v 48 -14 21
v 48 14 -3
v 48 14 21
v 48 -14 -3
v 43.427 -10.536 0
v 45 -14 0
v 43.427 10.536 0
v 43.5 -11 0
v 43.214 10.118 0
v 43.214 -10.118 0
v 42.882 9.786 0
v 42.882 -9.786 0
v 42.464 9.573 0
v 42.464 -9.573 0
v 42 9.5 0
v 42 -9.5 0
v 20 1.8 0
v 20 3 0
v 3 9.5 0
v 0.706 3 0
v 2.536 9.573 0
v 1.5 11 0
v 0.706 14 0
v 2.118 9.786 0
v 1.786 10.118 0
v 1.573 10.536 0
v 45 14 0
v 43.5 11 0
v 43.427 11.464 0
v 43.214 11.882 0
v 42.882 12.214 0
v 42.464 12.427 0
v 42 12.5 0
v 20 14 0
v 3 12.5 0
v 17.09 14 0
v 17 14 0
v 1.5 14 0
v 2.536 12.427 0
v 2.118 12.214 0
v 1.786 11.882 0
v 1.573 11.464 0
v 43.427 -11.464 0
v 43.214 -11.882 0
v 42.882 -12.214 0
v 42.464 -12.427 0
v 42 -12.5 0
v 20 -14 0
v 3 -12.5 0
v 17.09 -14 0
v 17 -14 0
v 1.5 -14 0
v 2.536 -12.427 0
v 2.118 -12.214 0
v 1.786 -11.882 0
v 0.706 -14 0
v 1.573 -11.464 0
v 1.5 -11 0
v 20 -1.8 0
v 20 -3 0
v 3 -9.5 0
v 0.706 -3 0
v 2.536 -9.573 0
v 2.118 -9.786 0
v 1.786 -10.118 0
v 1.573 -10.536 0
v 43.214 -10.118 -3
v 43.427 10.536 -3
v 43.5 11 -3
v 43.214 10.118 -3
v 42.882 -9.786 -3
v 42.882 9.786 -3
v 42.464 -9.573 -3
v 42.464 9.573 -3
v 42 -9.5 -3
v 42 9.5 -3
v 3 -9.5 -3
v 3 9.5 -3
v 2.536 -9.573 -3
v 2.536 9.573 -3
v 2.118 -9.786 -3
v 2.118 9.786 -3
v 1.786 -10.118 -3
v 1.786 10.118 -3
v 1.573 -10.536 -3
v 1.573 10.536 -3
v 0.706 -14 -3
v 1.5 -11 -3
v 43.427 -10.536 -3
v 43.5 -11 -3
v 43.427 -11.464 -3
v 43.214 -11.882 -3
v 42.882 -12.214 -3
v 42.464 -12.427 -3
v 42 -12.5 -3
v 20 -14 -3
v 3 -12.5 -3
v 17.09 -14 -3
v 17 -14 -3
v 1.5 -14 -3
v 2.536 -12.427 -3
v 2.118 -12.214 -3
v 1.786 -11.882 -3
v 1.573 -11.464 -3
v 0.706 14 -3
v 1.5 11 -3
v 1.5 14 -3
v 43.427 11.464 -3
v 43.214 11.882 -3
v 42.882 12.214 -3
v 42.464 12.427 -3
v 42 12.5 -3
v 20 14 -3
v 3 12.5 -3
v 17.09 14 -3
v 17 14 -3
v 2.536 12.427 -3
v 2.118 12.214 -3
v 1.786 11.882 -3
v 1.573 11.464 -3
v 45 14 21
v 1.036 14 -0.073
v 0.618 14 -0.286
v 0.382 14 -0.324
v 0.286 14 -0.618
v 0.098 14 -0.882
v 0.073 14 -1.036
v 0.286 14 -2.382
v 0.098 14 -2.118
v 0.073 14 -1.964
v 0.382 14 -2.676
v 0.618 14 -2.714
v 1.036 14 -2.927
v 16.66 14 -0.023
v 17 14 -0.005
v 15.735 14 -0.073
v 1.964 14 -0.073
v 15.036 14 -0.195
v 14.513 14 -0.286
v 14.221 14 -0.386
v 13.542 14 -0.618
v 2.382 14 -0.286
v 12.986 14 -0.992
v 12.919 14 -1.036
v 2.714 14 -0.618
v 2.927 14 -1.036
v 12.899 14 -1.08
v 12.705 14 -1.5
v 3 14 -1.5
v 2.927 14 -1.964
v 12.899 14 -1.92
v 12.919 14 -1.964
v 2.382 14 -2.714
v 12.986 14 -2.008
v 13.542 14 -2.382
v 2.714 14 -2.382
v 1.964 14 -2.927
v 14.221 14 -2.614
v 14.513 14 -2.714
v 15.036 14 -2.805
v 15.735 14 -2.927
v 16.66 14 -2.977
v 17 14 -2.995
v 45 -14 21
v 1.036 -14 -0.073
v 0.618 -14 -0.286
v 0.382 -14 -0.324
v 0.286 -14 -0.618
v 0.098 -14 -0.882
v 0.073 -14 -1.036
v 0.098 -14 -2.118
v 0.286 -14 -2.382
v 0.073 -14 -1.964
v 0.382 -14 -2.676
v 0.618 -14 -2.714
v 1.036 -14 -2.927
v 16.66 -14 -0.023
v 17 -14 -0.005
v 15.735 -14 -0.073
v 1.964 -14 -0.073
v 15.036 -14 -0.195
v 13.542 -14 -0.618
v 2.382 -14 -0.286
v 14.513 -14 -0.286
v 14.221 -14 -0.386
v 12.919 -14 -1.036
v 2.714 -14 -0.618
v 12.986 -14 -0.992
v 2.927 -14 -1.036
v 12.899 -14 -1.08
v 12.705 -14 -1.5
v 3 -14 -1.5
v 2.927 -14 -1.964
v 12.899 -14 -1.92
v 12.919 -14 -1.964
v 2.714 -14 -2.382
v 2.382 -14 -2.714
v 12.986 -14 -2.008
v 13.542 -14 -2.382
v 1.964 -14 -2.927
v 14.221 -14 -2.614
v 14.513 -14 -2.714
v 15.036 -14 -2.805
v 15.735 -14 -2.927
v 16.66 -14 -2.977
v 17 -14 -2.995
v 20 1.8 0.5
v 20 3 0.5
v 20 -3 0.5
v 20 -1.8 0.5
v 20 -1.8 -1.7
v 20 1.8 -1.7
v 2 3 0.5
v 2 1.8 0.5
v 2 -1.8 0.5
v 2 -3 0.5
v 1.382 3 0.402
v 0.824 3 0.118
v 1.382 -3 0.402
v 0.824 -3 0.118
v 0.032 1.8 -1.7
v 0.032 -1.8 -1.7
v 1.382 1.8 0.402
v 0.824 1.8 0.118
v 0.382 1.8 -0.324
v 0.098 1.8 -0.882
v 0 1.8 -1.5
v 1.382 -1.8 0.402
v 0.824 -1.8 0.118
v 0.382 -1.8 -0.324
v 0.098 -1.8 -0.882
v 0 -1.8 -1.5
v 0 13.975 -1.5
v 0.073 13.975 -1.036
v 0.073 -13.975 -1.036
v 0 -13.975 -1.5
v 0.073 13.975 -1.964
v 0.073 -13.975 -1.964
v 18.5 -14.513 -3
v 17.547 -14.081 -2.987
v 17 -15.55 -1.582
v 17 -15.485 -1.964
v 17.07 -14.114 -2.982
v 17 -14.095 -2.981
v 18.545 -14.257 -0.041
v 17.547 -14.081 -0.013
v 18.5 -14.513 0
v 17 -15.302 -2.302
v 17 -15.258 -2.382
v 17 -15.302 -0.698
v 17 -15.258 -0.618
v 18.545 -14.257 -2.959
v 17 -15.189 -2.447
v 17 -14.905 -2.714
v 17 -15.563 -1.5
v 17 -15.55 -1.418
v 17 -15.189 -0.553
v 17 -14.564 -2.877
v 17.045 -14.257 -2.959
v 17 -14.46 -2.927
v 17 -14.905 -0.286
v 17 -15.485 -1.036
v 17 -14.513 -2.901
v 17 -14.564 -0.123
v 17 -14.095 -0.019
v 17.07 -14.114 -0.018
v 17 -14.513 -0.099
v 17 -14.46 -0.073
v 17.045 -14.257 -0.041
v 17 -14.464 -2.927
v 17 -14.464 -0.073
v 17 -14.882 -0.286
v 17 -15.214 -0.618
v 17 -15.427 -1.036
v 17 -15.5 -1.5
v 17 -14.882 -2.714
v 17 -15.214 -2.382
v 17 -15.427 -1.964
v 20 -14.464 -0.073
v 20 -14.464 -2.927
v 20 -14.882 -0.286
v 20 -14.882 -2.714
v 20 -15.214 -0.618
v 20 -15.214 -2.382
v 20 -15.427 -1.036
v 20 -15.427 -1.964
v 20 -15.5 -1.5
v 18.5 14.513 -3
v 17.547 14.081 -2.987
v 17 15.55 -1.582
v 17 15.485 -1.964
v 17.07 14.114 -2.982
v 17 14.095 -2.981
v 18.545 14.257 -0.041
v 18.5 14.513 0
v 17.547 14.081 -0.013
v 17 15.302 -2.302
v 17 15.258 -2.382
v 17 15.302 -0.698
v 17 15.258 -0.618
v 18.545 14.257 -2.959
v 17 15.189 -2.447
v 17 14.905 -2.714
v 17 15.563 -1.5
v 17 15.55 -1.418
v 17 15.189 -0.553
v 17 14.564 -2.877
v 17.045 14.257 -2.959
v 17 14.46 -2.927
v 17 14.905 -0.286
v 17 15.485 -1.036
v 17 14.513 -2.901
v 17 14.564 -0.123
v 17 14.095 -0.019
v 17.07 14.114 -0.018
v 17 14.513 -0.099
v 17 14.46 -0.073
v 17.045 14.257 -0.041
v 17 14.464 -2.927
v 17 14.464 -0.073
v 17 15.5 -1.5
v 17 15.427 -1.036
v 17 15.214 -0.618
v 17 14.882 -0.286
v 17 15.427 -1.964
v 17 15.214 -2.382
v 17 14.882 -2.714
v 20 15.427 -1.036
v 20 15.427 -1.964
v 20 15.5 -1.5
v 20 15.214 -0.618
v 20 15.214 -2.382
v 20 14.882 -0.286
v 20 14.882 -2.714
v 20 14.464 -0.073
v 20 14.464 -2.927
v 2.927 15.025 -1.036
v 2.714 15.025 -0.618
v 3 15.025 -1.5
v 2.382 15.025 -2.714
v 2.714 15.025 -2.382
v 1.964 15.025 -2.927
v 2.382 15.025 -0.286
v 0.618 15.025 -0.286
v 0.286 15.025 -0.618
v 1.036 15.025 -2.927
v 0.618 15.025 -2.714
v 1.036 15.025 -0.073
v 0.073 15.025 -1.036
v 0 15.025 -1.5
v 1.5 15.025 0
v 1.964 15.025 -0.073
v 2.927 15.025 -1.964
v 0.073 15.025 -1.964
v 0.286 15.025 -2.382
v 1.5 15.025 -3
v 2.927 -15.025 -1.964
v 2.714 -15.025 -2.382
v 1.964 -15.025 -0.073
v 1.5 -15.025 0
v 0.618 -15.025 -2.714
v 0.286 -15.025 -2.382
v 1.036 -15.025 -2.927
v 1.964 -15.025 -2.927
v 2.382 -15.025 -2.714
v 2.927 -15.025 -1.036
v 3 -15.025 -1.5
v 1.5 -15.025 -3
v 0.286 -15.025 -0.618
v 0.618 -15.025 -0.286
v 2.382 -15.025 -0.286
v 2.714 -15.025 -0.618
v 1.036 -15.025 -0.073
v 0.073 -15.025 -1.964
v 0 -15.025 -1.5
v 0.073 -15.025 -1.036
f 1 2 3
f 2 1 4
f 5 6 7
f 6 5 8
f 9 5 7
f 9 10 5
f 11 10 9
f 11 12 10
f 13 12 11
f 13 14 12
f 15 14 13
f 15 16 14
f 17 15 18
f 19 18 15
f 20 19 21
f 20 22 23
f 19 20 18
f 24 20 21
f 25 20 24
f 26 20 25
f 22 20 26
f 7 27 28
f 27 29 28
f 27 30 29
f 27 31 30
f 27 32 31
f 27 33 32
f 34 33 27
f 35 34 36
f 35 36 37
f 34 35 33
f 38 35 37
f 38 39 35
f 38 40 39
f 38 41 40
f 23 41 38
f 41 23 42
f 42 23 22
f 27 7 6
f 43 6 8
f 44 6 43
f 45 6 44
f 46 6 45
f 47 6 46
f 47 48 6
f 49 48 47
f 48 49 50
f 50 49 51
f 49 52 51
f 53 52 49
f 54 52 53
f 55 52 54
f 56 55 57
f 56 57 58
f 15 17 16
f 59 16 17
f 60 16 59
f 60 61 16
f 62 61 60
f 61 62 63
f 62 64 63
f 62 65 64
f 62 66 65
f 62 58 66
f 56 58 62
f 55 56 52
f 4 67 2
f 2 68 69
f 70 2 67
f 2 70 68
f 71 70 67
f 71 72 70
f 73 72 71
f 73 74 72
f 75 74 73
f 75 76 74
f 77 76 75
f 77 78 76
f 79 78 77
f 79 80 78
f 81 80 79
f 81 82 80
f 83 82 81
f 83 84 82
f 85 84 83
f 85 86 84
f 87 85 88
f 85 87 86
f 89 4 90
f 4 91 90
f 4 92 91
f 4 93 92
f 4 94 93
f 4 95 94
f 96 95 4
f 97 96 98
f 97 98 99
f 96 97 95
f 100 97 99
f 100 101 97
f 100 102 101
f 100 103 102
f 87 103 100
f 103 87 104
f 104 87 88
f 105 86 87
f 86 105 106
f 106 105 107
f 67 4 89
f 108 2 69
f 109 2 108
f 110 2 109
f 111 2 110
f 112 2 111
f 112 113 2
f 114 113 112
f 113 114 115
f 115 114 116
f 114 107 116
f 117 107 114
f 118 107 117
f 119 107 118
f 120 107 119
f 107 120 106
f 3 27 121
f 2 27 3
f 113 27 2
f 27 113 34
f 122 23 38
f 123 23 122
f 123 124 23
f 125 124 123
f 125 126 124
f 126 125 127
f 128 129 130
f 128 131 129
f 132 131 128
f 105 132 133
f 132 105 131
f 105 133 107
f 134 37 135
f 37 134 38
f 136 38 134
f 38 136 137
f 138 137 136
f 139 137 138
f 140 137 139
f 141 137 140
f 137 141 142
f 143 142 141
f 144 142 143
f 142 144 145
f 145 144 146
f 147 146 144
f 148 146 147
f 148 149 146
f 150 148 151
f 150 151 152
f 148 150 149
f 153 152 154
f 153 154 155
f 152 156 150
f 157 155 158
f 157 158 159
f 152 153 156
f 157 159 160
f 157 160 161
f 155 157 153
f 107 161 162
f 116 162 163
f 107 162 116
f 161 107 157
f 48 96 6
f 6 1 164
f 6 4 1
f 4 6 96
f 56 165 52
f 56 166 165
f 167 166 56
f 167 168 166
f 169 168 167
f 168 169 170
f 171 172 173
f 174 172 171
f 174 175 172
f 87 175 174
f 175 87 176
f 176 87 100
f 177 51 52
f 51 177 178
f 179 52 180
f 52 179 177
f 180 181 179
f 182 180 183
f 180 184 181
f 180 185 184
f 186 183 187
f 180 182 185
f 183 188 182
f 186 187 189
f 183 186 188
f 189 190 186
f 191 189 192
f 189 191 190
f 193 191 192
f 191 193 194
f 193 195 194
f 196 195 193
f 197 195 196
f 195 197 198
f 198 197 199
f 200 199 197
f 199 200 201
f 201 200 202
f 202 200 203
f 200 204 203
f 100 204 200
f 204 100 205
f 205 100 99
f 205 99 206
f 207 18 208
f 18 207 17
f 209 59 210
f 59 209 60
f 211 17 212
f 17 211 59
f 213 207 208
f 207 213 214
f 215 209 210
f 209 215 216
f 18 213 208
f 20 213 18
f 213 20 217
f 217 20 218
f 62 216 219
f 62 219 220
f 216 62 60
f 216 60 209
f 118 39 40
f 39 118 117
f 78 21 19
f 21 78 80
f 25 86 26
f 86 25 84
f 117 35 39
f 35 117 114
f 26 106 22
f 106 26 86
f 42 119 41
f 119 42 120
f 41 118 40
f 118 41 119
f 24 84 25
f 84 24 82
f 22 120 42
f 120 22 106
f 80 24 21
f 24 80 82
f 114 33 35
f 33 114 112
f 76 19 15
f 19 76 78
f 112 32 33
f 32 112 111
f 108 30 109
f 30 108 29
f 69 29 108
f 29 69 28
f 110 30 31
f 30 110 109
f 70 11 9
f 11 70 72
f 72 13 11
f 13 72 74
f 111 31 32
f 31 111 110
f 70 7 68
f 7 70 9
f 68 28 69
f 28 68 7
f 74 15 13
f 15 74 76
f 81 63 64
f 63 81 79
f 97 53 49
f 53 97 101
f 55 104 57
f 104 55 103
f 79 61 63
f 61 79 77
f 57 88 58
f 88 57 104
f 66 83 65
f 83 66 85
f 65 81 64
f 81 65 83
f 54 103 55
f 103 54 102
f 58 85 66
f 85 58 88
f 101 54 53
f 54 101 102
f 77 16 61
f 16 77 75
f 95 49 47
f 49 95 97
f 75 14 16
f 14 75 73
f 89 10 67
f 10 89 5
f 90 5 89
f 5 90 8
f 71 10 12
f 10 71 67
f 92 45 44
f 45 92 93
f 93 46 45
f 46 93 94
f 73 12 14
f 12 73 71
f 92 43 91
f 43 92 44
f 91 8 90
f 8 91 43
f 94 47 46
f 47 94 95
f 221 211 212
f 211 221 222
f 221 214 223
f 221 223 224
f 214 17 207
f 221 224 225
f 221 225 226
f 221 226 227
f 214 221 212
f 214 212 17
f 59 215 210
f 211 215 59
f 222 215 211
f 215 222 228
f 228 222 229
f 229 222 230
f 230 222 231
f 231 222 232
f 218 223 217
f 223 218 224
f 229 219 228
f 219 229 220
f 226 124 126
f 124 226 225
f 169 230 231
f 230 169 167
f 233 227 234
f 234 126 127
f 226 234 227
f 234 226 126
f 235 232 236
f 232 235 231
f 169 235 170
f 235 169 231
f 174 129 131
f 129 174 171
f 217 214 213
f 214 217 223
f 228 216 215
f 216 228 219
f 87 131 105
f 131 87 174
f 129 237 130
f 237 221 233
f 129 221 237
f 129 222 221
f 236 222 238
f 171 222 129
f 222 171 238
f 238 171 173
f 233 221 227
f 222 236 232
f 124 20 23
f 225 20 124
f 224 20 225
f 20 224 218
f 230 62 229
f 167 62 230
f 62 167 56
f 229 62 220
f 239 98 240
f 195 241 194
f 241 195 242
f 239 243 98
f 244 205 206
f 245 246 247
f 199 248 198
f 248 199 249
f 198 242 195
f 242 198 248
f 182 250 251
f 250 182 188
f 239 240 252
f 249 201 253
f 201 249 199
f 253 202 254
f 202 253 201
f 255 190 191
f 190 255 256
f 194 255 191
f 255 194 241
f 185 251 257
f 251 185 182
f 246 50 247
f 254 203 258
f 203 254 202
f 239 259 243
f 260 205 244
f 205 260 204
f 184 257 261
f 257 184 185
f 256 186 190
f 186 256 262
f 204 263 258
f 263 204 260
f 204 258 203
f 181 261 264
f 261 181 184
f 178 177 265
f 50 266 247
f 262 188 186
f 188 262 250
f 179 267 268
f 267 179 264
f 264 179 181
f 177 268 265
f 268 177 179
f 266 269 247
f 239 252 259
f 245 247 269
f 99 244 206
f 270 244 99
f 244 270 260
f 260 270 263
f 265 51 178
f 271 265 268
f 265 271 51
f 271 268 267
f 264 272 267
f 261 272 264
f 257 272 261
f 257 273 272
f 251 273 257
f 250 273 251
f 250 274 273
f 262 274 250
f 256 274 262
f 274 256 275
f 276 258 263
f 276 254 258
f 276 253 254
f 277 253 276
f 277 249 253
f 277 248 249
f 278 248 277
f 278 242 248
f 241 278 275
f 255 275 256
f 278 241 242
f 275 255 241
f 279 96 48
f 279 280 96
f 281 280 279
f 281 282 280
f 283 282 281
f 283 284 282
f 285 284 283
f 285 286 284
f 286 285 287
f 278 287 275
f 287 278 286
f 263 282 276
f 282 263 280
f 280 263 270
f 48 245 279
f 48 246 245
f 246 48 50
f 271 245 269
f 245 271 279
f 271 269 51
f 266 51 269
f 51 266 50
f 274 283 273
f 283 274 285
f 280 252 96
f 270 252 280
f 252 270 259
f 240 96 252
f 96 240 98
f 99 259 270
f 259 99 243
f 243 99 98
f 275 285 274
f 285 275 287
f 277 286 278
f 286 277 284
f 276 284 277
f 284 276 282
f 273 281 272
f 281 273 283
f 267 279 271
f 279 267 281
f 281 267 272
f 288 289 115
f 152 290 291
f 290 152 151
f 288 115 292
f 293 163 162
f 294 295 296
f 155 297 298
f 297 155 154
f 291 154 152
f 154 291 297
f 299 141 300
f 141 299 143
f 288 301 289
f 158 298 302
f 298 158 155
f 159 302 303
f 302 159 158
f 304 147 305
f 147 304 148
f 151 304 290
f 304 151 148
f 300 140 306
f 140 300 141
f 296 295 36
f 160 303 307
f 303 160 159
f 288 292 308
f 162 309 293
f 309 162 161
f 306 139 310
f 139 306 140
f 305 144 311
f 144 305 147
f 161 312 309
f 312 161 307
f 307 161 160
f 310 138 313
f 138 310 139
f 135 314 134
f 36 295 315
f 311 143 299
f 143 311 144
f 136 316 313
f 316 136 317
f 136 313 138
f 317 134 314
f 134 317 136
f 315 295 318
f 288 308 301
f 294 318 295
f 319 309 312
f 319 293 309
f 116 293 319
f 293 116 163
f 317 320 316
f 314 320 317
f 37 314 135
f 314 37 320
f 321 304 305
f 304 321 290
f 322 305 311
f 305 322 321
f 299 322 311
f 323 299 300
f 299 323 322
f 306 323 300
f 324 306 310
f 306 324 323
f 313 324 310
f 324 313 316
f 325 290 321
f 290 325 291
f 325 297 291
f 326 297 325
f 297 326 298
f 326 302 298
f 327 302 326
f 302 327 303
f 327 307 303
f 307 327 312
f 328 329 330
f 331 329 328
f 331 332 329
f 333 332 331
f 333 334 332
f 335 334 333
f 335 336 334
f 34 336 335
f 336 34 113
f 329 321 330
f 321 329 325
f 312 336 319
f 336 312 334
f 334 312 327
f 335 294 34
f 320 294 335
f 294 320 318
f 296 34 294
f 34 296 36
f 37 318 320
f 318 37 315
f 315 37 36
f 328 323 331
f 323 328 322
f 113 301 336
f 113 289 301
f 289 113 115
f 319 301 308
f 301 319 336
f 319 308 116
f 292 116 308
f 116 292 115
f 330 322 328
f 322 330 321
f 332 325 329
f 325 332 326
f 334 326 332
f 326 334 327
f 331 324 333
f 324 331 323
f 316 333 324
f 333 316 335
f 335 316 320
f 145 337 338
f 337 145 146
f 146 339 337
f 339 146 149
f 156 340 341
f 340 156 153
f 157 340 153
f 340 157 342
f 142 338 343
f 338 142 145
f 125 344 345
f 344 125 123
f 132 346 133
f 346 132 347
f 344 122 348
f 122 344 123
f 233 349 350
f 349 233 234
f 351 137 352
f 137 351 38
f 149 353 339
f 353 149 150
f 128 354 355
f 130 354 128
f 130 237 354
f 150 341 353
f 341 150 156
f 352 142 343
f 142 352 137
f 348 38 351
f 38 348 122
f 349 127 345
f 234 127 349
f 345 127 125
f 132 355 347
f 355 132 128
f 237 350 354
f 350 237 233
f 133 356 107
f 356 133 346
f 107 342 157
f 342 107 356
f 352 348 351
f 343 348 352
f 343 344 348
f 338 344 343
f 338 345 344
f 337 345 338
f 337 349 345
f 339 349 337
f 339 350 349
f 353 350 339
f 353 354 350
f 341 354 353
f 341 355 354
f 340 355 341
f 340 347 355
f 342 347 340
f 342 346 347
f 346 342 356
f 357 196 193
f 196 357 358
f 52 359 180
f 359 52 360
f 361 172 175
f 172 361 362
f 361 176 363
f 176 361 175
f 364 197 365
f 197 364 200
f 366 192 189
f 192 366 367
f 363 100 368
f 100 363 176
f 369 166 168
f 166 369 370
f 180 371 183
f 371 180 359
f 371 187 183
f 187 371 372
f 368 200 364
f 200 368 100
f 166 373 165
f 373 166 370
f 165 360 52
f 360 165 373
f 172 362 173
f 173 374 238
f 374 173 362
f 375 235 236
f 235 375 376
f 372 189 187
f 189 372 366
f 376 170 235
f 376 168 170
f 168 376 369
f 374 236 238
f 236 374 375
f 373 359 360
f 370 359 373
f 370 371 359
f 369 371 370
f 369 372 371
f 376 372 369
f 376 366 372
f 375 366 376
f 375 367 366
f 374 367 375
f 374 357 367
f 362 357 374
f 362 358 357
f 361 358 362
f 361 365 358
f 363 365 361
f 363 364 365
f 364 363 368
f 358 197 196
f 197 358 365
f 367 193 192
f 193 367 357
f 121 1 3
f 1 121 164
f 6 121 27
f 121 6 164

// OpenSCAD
// Thing for the remote to bed-goes-up, bed-goes-down.

// Total inner length, should more or less be the width of the thing it rests on. Note, at least 23 mm.
bed_support_thickness = 23;

// The length of the thing going between the support and the matress.
tounge_length = 21;

// The rest here, should not need adjusting.
// Generel thickness of the thing.
thickness = 3;

// Generel width of the thing.
width = 28;

// Connection sizes - measured from the end that is inserted.
connector_offset = 20;

// Slack is extra length, to allow for slip on the bed support.
slack = 2;



// Weird cutout at the inside
cutout_outside_width = 6.0;
cutout_outside_height = 0.5;
cutout_inside_height = 2.2;
cutout_inside_width = 3.0 + 0.6;
cutout_outside_length = connector_offset;

cutout_left_thickness = 1.2;

// Total lenght, is the total length of one of base cube
total_length = connector_offset + slack + bed_support_thickness + thickness;

pad = 0.05;

// Various elements make it up.

$fn = 20;
// "Base"
// translate([total_length/2, 0, thickness / 2])

round_thickness = thickness + cutout_outside_height * 2; 

// This sucks.
module round_it() {
    translate([round_thickness/2,0,-thickness/2])
    rotate([90,0,0])

    difference() {
    
        difference() {
            cube([round_thickness+pad*2,round_thickness+pad*2, width*1.5], center = true);
            cylinder(r = round_thickness / 2, h = width*2 + 2*pad, center = true);
            
        }
        translate([round_thickness,0,0])
        cube([round_thickness*2,round_thickness*2, width*2], center = true);
    }
}


// The round taps. 
round_tap_thickness = 1;
module round_tap() {
    translate([thickness/2,width/2 + round_tap_thickness/2, -thickness/2])
    rotate([90,0,0])
    cylinder(r = thickness / 2, h = round_tap_thickness + pad, center = true);
}

module round_taps() {
    round_tap();
    mirror([0,1,0]) round_tap();
}

module base() {
    difference() {
        difference() {
            // Base with cutout extra
            union() {
                translate([total_length/2, 0, -(thickness / 2)])
                cube([total_length, width, thickness], center = true);

                translate([0,-(cutout_outside_width/2),0])
                cube([cutout_outside_length, cutout_outside_width, cutout_outside_height]);
            }

            union() {
                // Weird cutout
                translate([-pad,-(cutout_inside_width/2),-(cutout_inside_height - cutout_outside_height)])
                cube([cutout_outside_length+pad, cutout_inside_width, cutout_inside_height+pad]);

                slits();
            }
        }
        round_it();
    }

    taps();

    round_taps();

}

// Tongue...
module tounge() {
  translate([thickness/2, 0, (tounge_length + thickness)/2])
  cube([thickness,width,tounge_length + thickness], center = true);
}

// Taps
module tap() {
    cylinder( r = thickness / 2, h = thickness, center = true );

    // Cut off things sticking outside base cylinder
    difference() {
        // Hackish here. I do not care to look up the math.
        translate([-sin(20)*thickness/2,0,0])
        difference() {
            rotate([0,20,0])
            cylinder( r = thickness / 2, h = thickness * 2);
            cylinder( r = thickness / 2, h = thickness, center = true );
        }
        translate([thickness/2,-50,0])
        cube([100,100,100]);
    }
}

module single_tap() {
    translate([-thickness/2+connector_offset,-width/2,-thickness/2])
    rotate([270,0,90])
    tap();
}

module taps() {
    single_tap();
    mirror([0,1,0]) single_tap();
    
}


// Slits are at the sides
module slit() {
    translate([thickness,0,-thickness-pad])
    union() {
        cylinder(r = thickness / 2, h = thickness + 2 * pad);
        translate([0,-thickness/2,0])
        cube([total_length - thickness * 3, thickness, thickness + 2*pad]);
        translate([total_length - thickness*3,0,0])
        cylinder(r = thickness / 2, h = thickness + 2 * pad);
    }
}

module slits() {
    translate([0, width/2 - thickness,0]) slit();
    translate([0, -width/2 + thickness,0]) slit();
}

module main() {
    base();
    translate([total_length-thickness,0,-thickness])
    tounge();
    
}


main();
